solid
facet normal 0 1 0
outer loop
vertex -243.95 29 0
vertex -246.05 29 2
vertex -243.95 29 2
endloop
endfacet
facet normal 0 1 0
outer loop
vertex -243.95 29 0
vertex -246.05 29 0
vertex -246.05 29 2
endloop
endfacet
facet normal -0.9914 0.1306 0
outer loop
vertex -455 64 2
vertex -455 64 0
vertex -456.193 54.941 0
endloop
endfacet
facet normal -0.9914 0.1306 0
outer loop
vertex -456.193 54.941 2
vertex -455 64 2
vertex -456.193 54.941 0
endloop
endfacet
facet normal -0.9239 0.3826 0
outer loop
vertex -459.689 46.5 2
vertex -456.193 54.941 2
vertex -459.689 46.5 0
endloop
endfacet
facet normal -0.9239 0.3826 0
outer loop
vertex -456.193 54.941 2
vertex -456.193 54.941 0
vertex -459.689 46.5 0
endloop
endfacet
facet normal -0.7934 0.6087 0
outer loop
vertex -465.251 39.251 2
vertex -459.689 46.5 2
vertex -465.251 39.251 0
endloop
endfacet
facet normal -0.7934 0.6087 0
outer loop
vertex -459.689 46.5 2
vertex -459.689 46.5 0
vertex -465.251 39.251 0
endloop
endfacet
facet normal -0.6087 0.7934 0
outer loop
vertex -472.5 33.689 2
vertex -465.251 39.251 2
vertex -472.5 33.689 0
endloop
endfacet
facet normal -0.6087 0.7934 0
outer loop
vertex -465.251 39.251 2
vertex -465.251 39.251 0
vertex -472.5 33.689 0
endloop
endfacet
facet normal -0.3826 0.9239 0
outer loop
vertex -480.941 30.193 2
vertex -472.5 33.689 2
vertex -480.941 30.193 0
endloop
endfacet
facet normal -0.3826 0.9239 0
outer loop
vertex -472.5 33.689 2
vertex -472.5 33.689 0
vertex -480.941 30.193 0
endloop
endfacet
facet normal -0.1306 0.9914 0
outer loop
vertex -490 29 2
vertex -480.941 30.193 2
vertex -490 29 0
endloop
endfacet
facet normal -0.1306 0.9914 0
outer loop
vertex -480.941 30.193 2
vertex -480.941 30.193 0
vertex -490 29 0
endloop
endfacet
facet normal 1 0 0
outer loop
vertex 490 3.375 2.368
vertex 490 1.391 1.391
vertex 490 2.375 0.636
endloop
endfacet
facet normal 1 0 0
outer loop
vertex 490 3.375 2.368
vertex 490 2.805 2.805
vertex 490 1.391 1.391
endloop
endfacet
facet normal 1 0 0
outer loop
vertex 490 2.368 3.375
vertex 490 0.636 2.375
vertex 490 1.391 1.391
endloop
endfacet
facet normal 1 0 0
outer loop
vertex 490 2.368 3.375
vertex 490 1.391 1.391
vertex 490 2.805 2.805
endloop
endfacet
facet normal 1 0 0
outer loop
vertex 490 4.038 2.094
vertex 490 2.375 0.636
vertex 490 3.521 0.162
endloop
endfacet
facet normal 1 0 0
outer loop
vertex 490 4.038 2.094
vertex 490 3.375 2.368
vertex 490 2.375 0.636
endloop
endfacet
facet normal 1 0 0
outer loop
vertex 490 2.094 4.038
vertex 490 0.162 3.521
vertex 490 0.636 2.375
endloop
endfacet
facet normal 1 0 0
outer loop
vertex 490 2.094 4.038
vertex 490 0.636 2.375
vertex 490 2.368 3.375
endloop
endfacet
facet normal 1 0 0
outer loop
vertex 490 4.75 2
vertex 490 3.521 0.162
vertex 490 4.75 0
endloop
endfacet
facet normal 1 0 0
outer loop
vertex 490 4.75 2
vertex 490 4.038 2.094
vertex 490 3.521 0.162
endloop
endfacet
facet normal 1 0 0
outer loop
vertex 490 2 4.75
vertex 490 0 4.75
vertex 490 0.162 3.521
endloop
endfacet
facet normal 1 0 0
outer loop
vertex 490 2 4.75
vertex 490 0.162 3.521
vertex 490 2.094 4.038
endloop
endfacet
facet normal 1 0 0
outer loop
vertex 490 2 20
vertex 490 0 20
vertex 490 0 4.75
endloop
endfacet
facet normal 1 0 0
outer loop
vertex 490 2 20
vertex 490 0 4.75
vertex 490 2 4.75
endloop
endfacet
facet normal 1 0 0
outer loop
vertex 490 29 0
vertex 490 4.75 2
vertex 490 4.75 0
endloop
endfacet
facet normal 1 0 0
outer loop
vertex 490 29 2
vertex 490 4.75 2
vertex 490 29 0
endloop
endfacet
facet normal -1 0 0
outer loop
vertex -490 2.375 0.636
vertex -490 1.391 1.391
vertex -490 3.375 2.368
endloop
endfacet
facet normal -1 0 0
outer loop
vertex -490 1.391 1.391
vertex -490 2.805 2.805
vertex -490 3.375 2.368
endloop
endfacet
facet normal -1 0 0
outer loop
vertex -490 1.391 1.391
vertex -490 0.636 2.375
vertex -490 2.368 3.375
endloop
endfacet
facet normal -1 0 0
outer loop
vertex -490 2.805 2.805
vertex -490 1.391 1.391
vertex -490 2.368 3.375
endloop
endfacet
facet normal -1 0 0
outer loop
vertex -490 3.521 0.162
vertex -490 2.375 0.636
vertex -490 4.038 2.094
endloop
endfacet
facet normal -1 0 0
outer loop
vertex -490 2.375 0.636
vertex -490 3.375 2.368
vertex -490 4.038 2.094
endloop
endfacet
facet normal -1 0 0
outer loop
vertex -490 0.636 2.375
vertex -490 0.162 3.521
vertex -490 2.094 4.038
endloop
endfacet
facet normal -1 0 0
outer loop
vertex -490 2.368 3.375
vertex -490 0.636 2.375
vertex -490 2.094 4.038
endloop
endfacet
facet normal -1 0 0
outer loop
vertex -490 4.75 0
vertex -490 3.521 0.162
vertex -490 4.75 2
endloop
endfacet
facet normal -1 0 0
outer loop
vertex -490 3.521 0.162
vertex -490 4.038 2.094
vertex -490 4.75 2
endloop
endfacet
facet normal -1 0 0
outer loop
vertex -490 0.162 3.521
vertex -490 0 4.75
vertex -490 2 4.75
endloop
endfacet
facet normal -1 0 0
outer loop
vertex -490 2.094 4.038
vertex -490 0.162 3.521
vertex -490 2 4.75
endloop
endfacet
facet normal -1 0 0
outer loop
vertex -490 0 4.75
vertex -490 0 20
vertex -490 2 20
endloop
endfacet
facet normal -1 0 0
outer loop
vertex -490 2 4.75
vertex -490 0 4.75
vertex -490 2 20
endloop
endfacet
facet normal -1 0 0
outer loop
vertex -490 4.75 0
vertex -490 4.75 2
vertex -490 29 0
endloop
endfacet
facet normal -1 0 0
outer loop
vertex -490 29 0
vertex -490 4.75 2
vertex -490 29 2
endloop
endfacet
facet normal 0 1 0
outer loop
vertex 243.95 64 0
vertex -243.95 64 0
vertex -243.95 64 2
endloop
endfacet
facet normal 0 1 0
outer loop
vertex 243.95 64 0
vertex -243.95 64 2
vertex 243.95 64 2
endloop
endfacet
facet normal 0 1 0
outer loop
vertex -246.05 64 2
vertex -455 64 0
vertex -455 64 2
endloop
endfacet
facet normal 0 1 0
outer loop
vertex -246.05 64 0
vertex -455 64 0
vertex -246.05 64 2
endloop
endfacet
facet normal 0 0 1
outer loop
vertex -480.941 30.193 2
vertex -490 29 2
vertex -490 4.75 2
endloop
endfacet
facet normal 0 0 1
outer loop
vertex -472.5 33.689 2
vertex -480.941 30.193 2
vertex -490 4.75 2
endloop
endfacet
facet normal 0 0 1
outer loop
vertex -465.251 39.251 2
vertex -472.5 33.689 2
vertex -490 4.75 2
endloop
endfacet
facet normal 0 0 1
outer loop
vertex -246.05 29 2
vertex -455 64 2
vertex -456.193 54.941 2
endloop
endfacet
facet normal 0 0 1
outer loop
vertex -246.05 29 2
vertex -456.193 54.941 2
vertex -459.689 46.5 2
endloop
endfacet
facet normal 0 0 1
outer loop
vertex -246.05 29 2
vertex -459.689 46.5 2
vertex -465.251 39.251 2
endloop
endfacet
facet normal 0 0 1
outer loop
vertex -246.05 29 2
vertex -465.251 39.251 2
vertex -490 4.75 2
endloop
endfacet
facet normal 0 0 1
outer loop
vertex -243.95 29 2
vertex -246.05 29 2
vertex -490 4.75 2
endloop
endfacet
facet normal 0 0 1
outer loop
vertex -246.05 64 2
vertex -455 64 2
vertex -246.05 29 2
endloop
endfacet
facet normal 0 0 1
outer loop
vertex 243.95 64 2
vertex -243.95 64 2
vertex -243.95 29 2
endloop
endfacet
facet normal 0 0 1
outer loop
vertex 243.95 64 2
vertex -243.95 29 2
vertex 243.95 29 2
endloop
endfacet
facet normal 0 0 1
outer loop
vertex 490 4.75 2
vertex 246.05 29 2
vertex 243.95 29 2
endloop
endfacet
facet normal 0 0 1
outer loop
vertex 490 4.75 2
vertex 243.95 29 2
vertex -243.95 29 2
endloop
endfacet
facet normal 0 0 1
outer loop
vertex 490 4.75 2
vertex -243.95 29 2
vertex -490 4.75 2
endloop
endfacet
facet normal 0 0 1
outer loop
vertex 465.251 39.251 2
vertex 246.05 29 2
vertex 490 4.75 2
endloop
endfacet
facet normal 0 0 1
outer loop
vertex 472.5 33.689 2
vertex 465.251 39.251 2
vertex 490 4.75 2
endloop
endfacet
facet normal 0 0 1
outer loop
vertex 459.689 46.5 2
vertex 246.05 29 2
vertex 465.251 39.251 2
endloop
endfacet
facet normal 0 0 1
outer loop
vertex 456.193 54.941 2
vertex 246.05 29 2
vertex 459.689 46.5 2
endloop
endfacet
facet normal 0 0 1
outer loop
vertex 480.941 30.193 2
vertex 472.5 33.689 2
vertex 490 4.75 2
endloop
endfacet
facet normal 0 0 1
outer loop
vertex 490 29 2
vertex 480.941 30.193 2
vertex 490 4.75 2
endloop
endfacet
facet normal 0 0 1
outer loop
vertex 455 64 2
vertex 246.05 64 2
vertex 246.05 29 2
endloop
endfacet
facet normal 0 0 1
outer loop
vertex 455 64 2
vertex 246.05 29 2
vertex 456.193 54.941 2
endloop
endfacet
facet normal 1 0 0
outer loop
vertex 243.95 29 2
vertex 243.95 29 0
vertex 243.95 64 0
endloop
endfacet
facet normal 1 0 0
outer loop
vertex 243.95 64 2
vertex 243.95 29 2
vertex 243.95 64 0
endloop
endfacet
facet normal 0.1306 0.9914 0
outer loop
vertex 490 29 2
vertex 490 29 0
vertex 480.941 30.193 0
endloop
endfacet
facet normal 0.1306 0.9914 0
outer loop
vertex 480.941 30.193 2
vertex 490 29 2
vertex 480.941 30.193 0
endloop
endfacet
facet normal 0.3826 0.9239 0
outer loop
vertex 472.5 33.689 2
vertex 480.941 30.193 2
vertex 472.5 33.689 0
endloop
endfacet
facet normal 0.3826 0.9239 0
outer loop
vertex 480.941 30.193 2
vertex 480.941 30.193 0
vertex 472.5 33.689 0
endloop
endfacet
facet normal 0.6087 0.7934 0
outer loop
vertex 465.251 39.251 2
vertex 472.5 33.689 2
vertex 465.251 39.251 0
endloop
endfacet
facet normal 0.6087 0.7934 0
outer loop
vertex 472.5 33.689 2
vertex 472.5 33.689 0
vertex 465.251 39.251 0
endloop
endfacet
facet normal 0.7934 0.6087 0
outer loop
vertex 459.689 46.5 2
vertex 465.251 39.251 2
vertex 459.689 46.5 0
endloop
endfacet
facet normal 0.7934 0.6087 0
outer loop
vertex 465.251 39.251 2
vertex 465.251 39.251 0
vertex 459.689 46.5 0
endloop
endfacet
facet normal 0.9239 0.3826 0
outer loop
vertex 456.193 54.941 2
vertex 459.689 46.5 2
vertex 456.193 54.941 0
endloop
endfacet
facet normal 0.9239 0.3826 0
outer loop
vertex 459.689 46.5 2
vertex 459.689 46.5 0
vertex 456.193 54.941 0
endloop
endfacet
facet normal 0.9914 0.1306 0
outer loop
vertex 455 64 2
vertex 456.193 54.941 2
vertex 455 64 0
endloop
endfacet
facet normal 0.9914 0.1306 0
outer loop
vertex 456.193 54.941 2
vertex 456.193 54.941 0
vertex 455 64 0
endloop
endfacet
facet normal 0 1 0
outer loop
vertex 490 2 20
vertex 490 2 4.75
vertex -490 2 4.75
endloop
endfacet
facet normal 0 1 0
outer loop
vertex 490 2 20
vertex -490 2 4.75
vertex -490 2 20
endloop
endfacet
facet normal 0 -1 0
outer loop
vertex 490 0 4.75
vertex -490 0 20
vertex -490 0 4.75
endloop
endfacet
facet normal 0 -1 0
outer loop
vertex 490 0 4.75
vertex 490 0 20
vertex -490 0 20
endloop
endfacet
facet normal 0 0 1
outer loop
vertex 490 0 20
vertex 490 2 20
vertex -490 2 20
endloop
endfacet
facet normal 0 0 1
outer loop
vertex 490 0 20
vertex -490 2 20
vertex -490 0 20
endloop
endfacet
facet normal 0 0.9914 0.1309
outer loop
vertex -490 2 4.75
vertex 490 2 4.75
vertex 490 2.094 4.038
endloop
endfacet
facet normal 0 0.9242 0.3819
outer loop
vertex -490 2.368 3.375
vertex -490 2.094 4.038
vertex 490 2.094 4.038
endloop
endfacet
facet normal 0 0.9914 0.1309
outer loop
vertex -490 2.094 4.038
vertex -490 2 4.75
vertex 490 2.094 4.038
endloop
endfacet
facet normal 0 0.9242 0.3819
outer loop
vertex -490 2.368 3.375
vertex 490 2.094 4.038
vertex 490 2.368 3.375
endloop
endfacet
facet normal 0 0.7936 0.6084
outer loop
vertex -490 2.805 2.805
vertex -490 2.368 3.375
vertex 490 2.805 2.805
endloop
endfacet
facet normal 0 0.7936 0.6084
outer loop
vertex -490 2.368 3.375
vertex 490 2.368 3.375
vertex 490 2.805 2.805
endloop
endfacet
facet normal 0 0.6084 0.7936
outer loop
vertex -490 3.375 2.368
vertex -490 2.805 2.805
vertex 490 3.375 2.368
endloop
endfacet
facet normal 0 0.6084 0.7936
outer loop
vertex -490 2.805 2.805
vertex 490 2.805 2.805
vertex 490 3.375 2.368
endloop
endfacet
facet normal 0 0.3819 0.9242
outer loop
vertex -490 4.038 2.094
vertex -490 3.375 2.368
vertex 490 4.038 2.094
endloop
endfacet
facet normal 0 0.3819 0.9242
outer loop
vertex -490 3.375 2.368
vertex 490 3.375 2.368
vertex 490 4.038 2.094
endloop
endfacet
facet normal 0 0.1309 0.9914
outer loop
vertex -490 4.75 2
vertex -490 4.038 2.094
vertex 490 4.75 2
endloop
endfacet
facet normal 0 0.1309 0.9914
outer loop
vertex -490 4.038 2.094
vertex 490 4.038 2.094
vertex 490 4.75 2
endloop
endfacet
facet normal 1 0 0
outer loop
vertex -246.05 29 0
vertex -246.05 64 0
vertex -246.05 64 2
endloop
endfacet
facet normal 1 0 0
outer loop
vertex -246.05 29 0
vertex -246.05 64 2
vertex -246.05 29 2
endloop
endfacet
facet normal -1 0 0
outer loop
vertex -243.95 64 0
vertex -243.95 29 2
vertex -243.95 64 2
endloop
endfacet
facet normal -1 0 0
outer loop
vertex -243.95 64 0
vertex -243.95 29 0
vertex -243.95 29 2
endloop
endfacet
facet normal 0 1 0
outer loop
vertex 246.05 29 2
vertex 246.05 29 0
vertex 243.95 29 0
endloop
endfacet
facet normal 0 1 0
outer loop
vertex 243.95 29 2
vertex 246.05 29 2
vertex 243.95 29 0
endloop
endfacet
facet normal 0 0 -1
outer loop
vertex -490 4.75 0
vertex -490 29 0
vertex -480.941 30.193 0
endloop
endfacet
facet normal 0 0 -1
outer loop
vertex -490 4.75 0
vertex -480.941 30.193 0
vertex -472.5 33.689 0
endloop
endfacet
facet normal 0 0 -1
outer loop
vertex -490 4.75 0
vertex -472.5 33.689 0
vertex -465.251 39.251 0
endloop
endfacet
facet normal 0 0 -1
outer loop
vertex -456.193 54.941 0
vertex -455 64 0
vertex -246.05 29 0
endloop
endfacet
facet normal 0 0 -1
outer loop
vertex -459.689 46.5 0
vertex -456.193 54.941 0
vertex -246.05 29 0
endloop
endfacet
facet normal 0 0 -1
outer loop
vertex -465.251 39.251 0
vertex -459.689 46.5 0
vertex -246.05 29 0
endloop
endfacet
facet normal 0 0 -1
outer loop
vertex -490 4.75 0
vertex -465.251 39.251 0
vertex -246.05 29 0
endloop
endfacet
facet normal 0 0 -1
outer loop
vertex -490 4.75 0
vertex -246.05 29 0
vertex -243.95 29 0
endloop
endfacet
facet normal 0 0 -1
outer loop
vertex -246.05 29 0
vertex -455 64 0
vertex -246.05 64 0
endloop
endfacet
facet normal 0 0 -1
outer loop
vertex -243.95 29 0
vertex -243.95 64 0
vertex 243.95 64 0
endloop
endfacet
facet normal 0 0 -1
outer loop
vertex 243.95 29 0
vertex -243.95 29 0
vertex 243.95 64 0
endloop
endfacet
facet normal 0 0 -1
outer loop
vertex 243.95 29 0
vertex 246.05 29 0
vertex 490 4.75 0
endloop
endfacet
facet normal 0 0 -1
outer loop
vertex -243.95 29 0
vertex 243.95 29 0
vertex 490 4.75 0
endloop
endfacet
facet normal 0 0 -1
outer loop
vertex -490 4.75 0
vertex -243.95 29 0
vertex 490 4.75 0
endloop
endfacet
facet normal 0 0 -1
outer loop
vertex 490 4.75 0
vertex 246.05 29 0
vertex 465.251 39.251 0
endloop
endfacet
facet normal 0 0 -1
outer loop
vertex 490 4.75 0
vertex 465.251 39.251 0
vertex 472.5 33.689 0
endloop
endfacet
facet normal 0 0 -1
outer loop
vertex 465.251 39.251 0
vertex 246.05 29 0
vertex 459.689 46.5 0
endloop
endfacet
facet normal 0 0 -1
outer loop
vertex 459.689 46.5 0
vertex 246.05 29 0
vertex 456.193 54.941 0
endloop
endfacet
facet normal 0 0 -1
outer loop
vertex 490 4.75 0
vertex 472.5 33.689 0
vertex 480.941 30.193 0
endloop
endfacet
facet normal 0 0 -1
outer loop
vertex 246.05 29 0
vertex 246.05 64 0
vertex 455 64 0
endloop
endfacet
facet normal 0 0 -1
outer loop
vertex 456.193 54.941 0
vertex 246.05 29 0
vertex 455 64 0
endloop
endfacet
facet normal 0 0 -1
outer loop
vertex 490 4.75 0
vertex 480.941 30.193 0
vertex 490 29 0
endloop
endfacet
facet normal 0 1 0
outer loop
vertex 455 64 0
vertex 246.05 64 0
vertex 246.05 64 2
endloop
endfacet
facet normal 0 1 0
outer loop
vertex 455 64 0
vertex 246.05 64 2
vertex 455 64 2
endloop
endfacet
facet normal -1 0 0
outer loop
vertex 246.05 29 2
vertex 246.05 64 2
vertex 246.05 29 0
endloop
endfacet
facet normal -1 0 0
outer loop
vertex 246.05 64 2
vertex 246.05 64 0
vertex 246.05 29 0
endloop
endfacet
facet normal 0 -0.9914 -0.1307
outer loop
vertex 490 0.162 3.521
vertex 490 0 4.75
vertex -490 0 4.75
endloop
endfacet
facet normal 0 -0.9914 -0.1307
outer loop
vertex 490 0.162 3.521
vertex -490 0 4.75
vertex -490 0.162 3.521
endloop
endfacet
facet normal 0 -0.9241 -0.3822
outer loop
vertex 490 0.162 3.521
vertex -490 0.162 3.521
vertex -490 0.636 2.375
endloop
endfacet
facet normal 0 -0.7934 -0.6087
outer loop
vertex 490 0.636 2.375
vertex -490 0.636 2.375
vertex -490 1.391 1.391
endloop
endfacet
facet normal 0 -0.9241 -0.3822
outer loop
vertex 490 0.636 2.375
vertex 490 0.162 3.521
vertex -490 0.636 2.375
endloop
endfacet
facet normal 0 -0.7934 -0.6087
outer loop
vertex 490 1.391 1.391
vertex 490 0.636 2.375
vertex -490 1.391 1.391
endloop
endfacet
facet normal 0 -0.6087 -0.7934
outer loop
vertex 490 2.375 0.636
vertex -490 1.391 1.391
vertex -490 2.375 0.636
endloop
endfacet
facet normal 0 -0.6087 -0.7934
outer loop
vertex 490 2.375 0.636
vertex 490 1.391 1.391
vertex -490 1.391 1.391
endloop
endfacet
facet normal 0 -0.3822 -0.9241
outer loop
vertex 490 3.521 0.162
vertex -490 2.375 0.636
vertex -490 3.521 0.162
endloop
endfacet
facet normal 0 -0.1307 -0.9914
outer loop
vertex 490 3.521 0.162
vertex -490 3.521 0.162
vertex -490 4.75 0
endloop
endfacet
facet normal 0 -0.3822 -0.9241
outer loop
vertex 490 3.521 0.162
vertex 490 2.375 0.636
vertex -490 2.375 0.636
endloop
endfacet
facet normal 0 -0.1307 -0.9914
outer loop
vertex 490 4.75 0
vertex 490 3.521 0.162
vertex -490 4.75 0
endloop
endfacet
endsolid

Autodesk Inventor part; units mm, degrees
ref_plane "YZ Plane" through (0, 0, 0) normal (1, 0, 0) x (0, 1, 0)
ref_plane "XZ Plane" through (0, 0, 0) normal (0, 1, 0) x (-1, 0, 0)
ref_plane "XY Plane" through (0, 0, 0) normal (0, 0, 1) x (1, 0, 0)
sketch "Sketch1" plane through (0, 0, 0) normal (0, 0, 1) x (1, 0, 0)
  line L0 (-490, 64) -> (490, 64)
  line L1 (490, 64) -> (490, 0)
  line L2 (490, 0) -> (-490, 0)
  line L3 (-490, 0) -> (-490, 64)
  point P0 (0, 0)
  point P1 (0, 0)
  dimension "d0" = 980
  dimension "d1" = 64
extrude "Plate1" add sketch "Sketch1" along normal blind 2
sketch "Sketch2" plane through (490, 2, 0) normal (0, -1, 0) x (1, 0, 0)
  line L0 (-980, 0) -> (0, 0)
  line L1 (0, 0) -> (0, 20)
  line L2 (0, 20) -> (-980, 20)
  line L3 (-980, 20) -> (-980, 0)
edge flange "Flange1" height 20 angle 90 thickness 2 bend radius 2.75 thickness toward (0, -1, 0) relief round relief width 2 relief depth 1 edges at (0, 0, 2) wall of the first edge with corners at (-490, 2, 0) (490, 2, 0) (490, 2, 20) (-490, 2, 20)
bend "Bend1"
corner "Corner1"
sketch "Sketch5" plane through (0, 0, 0) normal (0, 0, -1) x (-1, 0, 0)
  line L0 (490, 64) -> (-490, 64) projected
  line L1 (490, 0) -> (-490, 0) projected
  circle A0 centre (0, 64) radius 35
  line L2 (243.95, 64) -> (246.05, 64)
  line L3 (246.05, 64) -> (246.05, 29)
  line L4 (246.05, 29) -> (243.95, 29)
  line L5 (243.95, 29) -> (243.95, 64)
  line L6 (-243.95, 64) -> (-246.05, 64)
  line L7 (-246.05, 64) -> (-246.05, 29)
  line L8 (-246.05, 29) -> (-243.95, 29)
  line L9 (-243.95, 29) -> (-243.95, 64)
  line L10 (0, 64) -> (0, 0) construction
  line L11 (-490, 0) -> (-490, 64)
  line L12 (490, 0) -> (490, 64)
  circle A1 centre (-490, 64) radius 35
  circle A2 centre (490, 64) radius 35
  point P0 (0, 0)
  point P1 (245, 29)
  point P2 (-245, 29)
  point P3 (246.05, 64)
  point P4 (-35, 64)
  point P5 (35, 64)
  point P6 (-246.05, 64)
  point P7 (455, 64)
  point P8 (490, 29)
  point P9 (-490, 29)
  point P10 (-455, 64)
  dimension "d45" = 70
  dimension "d48" = 2.1
  dimension "d49" = 490
  dimension "d51" = 29
  dimension "d52" = 35
extrude "Extrusion1" cut sketch "Sketch5" against normal through all contours L3 L4 L5 L0 | L0 L12 A2 | L9 L8 L7 L0 | L11 L0 A1 picked at (487.4039, 40.9592) picked at (-466.9592, 61.4039)
sketch "Sketch9" plane through (0, 0, 2) normal (0, 0, 1) x (1, 0, 0)
  line L0 (467.0539, 27.7998) -> (467.0539, 15.7998) construction
  line L1 (467.0539, 15.7998) -> (267.0539, 15.7998) construction
  line L2 (267.0539, 15.7998) -> (267.0539, 27.7998) construction
  line L3 (267.0539, 27.7998) -> (467.0539, 27.7998) construction
  line L4 (-490, 64) -> (490, 64) projected
  point P0 (0, 0)
  point P1 (1.05, 68)
  point P2 (490, 64)
  point P3 (-490, 64)
  dimension "d40" = 200
  dimension "d41" = 12
mark "Mark2"
equation "\"d2\" = Thickness"
equation "\"d3\" = BendReliefWidth"
equation "\"d4\" = BendReliefDepth"
equation "\"d5\" = MinimumRemnant"
equation "\"d6\" = TransitionRadius"
equation "\"d9\" = BendRadius"
equation "\"d10\" = CornerReliefSize"
equation "\"d11\" = GapSize"
equation "\"d12\" = JacobiRadiusSize"
equation "\"BendReliefWidth\" = Thickness"
equation "\"BendReliefDepth\" = 0.5 * Thickness"
equation "\"CornerReliefSize\" = 4 * Thickness"
equation "\"MinimumRemnant\" = 2 * Thickness"
equation "\"TransitionRadius\" = BendRadius"
equation "\"JacobiRadiusSize\" = BendRadius"
equation "\"GapSize\" = Thickness"
equation "\"Thickness\" = 2"
equation "\"BendRadius\" = 2.75"
properties part number "MSC 309 stringer BOARD  ####" material "Stainless Steel"
